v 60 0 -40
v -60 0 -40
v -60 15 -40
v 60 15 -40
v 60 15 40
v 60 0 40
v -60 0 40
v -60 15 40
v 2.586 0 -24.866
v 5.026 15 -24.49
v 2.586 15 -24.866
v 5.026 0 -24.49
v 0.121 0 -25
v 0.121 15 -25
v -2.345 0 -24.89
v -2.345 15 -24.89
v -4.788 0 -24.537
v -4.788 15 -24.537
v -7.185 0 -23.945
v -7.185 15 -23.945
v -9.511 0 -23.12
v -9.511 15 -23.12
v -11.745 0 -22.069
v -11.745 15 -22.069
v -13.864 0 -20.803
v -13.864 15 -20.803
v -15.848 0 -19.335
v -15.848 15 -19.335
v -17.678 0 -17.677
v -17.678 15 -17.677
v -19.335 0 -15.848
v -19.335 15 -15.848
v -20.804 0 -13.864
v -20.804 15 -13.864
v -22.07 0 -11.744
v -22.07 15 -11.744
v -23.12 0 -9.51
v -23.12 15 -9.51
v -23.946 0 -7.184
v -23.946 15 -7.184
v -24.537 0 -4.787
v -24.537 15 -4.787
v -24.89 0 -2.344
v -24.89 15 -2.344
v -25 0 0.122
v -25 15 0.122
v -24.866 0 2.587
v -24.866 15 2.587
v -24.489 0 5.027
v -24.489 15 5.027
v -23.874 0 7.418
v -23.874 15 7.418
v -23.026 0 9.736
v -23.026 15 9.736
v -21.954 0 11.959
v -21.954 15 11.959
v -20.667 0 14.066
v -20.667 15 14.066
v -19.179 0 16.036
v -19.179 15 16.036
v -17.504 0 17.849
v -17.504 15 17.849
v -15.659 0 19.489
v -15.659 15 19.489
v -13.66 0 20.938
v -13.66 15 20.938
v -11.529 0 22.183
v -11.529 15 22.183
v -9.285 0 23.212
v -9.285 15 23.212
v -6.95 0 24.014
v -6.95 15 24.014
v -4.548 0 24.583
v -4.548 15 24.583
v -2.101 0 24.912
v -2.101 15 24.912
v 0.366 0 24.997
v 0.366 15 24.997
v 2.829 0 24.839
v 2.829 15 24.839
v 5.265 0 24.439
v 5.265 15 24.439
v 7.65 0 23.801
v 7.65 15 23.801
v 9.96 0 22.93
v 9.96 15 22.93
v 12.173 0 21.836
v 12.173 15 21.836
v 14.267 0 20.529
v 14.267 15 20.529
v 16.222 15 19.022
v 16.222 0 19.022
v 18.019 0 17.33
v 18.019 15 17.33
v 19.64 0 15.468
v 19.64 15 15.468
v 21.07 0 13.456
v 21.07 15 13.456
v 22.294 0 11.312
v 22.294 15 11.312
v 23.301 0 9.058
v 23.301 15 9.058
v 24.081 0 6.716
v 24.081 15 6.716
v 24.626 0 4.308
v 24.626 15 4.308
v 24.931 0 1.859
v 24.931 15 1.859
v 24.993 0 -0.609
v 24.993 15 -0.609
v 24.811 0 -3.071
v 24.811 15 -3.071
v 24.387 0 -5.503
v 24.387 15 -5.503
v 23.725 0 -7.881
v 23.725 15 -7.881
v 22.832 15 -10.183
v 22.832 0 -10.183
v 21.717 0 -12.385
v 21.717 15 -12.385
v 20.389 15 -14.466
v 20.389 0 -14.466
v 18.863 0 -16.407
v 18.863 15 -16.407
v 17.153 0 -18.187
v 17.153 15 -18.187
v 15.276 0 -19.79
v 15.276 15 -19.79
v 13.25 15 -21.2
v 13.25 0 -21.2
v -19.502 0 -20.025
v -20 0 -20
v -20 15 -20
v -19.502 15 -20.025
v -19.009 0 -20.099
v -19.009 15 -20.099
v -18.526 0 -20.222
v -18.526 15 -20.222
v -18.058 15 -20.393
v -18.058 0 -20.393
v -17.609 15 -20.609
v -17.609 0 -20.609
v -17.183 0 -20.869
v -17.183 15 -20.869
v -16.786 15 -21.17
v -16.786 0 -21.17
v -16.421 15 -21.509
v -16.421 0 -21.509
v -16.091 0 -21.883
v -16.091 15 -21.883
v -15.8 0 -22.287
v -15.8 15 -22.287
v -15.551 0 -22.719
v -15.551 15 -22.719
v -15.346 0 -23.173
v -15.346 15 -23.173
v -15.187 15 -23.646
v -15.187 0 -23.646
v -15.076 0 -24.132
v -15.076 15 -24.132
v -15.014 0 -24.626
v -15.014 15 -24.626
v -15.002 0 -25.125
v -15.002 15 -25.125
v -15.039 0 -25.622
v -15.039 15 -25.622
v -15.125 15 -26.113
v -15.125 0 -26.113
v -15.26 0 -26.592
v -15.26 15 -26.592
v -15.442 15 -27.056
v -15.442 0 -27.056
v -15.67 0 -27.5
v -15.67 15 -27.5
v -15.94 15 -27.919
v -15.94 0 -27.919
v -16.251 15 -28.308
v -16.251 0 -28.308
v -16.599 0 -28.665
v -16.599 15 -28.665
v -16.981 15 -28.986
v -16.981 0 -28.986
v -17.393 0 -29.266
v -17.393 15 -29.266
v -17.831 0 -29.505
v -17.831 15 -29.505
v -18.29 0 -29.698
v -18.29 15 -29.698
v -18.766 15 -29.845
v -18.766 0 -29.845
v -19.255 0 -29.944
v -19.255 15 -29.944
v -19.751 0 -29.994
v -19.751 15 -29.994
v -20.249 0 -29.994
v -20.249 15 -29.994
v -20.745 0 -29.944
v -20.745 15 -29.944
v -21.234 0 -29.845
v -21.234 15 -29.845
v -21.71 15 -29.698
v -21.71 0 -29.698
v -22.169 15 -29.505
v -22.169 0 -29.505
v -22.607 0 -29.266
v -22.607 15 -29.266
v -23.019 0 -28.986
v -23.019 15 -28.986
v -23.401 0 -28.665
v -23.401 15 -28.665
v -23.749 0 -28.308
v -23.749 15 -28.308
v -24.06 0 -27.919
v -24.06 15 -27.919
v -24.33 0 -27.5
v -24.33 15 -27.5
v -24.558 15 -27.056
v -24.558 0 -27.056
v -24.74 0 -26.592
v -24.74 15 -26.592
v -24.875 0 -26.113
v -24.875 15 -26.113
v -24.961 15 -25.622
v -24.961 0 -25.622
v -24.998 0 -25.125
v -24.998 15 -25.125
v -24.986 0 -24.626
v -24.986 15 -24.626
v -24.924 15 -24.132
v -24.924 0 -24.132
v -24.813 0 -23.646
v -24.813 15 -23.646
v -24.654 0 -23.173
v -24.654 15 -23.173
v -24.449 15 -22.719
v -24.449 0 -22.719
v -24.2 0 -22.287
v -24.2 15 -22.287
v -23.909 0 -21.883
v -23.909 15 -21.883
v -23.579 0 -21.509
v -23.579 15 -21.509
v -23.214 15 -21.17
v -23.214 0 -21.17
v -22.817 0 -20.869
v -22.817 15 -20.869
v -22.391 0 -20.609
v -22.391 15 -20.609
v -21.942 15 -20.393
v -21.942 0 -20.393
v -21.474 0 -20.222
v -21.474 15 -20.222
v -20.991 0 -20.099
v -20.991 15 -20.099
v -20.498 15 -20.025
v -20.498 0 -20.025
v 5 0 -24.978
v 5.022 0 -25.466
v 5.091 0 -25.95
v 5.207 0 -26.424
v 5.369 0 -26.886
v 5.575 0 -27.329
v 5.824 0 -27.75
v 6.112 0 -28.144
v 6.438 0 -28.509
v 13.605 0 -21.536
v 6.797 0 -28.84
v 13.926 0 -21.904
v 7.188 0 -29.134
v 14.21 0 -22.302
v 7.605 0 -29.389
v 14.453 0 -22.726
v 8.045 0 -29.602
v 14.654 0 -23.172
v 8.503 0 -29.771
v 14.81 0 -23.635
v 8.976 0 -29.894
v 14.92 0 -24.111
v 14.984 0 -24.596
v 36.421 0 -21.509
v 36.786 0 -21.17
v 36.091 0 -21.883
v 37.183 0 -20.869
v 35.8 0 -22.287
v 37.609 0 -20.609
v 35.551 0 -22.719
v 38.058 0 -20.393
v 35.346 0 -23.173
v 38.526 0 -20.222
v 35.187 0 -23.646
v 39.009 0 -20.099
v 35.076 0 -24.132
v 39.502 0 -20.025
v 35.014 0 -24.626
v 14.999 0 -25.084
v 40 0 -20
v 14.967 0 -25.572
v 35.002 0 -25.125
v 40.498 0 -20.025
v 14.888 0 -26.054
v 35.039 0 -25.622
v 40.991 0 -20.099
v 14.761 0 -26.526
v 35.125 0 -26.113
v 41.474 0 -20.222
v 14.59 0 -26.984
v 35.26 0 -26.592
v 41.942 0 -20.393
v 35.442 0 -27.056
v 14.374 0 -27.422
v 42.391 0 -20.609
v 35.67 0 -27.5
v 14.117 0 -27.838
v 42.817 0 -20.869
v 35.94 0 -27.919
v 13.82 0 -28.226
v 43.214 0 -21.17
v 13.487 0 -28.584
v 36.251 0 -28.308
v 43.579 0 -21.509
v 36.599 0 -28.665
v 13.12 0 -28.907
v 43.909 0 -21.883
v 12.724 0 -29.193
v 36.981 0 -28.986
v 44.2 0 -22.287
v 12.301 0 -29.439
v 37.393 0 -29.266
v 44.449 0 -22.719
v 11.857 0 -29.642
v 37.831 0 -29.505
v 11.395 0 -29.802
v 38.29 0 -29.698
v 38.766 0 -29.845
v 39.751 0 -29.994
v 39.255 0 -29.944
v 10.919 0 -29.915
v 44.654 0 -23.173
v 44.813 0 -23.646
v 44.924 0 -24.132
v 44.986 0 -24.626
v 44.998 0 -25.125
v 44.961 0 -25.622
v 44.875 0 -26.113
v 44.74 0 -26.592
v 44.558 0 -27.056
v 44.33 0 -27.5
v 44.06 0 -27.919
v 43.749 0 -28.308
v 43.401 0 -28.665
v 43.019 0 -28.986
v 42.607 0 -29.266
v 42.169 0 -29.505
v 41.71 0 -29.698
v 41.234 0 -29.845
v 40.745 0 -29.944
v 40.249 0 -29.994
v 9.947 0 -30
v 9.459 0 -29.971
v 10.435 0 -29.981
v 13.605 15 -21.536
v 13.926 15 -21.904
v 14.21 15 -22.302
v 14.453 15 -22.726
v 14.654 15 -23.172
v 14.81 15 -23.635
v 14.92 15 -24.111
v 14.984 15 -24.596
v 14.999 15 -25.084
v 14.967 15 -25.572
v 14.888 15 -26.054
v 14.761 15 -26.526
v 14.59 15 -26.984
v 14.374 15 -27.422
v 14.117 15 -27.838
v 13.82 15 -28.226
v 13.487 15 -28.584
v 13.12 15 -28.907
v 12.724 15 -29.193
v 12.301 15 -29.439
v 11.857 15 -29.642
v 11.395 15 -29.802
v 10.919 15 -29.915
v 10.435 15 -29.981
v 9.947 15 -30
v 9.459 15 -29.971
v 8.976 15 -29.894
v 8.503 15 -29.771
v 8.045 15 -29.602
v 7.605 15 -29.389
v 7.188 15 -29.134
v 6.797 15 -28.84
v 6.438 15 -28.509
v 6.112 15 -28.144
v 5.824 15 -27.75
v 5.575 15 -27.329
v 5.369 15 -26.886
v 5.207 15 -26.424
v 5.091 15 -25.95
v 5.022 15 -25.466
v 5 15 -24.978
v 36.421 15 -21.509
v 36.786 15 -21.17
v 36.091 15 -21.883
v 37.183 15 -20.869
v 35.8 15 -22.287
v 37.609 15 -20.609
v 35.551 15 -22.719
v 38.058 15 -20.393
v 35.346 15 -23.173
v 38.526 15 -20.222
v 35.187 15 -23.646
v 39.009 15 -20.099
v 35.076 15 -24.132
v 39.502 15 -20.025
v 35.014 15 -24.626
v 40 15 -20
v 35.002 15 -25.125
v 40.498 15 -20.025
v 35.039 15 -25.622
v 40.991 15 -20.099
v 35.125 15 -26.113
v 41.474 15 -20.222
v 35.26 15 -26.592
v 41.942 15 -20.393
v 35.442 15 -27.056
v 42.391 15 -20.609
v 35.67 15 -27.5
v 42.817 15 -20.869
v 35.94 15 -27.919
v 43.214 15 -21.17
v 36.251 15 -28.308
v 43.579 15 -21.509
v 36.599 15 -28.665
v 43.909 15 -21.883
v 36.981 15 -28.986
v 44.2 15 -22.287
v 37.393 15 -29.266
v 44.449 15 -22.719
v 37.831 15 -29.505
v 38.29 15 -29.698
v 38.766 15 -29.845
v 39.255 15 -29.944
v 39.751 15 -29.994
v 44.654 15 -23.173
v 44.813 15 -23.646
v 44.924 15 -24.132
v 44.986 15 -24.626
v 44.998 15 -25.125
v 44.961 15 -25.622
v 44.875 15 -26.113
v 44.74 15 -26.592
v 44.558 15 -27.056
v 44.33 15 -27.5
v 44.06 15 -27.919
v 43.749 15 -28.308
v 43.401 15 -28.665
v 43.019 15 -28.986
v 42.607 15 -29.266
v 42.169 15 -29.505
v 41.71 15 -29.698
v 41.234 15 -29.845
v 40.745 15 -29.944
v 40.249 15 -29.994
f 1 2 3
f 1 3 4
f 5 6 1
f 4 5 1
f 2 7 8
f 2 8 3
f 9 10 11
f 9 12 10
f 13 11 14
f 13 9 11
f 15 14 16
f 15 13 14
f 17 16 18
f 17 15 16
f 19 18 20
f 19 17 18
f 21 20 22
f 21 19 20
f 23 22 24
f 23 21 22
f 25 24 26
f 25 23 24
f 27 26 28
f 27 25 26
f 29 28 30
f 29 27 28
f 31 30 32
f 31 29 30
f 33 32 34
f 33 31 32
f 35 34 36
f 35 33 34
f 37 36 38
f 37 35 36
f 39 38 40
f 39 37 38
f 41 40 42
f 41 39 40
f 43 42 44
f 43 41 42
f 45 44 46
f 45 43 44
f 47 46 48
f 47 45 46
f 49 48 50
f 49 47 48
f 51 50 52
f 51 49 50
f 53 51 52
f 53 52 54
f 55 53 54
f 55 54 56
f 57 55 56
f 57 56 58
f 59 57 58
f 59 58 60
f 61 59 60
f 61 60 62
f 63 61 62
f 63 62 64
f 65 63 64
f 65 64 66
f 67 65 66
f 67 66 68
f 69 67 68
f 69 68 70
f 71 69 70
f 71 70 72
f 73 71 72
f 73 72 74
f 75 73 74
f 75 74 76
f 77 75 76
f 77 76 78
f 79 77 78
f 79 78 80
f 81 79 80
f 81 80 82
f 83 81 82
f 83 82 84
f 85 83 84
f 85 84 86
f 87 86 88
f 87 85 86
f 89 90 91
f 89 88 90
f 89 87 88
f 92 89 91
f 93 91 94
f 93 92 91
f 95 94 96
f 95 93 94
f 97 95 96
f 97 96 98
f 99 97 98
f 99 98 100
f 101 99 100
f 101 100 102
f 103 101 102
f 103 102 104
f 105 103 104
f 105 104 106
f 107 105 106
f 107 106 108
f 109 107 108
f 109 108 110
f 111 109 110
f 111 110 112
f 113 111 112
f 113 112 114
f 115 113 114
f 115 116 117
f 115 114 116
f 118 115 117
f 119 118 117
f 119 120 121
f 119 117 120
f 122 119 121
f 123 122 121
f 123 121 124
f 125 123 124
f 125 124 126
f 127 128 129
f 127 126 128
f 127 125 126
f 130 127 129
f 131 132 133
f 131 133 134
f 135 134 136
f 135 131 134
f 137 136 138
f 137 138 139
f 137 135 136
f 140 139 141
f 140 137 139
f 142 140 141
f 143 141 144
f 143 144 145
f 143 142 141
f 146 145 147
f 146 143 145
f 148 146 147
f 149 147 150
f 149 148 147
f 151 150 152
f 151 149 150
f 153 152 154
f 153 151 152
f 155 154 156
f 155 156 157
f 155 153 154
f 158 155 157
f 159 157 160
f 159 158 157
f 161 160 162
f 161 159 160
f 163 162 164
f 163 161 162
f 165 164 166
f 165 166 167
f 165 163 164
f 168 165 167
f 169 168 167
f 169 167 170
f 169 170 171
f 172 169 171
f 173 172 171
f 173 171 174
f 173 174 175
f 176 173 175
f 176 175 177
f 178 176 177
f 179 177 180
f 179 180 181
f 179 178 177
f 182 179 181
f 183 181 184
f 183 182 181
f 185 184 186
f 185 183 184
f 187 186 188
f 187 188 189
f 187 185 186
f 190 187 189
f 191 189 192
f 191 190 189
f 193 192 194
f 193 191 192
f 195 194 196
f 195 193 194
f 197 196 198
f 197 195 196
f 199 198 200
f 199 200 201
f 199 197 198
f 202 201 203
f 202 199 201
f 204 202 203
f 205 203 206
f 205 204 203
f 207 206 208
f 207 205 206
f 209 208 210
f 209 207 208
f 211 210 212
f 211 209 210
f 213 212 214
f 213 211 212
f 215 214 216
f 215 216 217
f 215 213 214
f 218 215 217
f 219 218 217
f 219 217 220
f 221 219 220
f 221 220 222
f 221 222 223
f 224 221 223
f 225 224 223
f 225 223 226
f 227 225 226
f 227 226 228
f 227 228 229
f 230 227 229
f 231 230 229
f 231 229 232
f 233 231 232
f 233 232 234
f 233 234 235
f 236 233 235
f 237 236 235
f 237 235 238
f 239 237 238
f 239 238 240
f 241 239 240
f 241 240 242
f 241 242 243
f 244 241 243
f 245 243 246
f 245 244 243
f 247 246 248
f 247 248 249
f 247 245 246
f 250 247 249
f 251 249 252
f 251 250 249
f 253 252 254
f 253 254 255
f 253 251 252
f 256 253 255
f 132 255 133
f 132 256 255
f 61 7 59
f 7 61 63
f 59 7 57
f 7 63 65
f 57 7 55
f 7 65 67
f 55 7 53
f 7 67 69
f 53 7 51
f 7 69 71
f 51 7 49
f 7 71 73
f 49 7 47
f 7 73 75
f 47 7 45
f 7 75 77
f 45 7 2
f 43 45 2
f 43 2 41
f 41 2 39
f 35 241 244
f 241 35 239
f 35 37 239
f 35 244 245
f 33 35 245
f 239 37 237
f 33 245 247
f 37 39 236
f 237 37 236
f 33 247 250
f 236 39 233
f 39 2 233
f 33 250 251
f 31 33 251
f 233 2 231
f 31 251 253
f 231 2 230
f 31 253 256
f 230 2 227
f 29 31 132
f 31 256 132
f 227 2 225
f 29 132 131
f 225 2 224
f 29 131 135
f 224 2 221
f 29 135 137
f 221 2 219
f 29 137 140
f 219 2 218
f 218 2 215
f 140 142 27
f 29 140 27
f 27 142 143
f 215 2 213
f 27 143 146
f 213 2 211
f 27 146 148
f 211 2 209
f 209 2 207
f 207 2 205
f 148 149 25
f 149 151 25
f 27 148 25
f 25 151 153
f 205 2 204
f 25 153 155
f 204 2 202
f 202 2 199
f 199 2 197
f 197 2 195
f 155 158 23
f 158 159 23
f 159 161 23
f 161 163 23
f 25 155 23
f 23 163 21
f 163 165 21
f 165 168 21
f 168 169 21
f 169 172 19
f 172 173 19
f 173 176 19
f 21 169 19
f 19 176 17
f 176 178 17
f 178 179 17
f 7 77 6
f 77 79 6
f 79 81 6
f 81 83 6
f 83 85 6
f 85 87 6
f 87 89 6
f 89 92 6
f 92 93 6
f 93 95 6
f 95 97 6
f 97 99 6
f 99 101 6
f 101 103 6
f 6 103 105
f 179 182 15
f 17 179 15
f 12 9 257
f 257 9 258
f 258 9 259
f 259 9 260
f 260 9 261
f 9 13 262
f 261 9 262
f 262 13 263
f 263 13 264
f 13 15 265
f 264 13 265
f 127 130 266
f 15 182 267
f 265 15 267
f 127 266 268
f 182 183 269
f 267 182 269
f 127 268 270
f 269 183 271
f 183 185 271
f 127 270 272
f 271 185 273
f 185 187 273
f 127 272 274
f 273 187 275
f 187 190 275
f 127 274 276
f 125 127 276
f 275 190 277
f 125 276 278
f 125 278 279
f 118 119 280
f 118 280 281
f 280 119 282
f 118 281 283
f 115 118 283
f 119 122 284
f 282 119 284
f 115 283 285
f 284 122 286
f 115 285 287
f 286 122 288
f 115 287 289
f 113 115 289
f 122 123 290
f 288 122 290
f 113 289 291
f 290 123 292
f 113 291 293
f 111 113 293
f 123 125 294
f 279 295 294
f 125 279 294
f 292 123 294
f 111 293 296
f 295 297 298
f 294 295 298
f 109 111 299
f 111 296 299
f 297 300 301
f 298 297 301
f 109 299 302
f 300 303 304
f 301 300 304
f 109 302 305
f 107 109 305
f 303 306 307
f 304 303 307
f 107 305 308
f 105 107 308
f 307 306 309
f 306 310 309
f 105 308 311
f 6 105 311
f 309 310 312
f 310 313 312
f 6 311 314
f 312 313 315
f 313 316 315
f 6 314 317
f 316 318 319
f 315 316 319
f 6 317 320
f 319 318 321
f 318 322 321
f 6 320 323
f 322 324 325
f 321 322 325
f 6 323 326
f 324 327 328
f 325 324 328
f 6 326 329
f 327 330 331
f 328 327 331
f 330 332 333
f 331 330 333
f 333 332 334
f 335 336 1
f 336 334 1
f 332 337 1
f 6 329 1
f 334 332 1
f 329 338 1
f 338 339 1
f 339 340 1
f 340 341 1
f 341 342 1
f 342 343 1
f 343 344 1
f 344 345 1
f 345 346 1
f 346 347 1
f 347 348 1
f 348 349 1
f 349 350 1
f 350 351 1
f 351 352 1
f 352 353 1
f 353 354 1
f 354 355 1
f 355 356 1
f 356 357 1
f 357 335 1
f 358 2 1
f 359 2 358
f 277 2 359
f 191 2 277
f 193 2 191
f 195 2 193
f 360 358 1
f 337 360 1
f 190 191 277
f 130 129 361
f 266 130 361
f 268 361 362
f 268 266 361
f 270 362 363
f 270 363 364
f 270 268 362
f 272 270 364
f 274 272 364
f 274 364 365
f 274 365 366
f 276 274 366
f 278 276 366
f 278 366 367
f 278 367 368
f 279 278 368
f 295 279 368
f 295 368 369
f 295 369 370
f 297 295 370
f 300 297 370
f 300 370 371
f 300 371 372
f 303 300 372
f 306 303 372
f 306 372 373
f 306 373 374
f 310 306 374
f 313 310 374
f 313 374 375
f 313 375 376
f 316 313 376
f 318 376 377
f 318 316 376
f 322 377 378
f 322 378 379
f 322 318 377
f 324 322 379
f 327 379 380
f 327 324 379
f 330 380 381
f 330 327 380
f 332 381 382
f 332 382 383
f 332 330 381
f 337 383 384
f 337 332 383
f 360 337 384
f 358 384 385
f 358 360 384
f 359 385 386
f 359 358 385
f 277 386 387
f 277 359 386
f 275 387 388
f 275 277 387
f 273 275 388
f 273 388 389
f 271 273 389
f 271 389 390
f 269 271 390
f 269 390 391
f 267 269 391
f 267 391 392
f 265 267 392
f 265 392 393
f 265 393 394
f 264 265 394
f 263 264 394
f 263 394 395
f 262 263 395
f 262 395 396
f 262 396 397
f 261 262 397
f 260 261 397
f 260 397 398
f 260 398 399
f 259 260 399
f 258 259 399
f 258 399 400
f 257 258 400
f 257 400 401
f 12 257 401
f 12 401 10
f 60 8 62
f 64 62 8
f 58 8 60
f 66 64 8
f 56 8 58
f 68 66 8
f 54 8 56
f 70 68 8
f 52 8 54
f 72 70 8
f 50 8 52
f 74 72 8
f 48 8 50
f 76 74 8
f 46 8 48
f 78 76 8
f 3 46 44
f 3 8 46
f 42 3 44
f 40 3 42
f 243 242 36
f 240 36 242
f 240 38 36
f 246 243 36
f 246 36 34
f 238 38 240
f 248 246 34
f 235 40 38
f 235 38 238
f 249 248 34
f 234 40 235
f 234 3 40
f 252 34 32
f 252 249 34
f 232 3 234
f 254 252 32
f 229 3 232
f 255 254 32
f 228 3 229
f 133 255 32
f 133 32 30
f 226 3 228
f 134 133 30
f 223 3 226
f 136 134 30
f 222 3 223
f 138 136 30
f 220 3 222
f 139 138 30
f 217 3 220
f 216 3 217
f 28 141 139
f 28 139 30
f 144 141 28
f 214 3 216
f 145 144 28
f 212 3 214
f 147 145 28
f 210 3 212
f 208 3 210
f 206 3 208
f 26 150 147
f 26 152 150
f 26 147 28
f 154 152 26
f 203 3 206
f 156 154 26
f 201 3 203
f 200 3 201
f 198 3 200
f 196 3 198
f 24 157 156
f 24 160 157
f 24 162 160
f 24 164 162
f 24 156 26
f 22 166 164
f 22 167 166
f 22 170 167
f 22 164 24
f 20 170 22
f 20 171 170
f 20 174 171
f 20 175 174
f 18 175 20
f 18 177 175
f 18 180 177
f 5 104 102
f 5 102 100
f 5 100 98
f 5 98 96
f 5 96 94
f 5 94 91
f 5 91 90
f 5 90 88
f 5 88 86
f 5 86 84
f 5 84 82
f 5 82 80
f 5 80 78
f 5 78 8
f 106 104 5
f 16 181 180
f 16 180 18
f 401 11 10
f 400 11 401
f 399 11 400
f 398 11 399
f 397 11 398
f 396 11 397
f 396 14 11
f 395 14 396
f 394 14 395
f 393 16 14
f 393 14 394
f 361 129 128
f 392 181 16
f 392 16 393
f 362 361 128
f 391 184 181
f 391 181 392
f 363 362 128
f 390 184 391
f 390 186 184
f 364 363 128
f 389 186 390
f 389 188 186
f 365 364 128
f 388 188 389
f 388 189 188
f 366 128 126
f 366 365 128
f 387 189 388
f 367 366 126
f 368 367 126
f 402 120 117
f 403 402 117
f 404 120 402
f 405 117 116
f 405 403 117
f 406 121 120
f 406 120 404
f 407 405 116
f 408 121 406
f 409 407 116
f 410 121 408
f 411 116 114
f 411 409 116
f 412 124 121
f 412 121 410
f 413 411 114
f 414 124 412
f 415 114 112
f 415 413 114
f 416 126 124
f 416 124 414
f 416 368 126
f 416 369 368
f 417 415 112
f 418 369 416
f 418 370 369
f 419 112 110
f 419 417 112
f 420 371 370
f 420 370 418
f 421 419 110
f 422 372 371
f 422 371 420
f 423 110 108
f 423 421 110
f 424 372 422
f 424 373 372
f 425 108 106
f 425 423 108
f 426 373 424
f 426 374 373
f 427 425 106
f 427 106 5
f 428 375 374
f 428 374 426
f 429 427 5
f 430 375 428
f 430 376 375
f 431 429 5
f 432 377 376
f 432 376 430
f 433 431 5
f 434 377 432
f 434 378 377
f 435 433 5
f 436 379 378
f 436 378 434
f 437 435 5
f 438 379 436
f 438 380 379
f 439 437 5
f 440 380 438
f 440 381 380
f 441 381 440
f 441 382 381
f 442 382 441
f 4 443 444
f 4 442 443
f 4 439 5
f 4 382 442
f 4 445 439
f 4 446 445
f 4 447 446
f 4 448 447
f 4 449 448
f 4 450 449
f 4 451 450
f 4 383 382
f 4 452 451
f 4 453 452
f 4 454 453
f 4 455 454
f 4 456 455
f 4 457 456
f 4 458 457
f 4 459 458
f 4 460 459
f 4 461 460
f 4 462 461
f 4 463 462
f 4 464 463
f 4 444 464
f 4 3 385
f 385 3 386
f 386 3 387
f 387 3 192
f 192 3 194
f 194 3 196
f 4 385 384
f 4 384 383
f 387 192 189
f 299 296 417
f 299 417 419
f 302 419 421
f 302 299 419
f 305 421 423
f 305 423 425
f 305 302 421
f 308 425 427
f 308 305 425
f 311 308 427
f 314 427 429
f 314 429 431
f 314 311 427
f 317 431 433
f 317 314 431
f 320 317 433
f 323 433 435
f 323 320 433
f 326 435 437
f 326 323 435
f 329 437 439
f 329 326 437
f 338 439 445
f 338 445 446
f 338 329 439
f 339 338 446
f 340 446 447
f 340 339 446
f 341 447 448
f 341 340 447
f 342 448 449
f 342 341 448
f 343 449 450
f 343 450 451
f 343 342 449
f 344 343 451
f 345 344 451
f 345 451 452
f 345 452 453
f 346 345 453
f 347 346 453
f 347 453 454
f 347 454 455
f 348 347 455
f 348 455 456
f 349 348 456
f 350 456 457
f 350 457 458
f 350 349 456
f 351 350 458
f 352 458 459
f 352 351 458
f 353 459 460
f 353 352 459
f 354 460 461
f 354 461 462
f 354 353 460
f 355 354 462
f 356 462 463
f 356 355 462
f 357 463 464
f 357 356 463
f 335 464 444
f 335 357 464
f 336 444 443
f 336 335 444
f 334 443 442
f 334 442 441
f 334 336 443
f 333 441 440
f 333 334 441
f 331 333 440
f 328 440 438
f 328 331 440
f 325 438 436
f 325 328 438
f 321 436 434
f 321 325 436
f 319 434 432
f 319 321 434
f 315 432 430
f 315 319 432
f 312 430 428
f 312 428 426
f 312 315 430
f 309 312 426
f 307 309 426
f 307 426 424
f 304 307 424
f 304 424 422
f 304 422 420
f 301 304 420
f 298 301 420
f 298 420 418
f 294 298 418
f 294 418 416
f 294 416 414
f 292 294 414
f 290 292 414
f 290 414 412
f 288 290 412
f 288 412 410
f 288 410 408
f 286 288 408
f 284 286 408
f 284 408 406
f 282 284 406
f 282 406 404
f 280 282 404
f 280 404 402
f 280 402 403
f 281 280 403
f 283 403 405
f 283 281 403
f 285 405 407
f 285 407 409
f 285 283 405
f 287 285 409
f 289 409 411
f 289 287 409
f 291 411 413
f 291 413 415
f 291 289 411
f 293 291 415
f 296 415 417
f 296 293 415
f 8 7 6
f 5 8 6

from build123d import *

# Parameters (mm, degrees)
SKETCH_1_W             = 120
SKETCH_1_H             = 80
EXTRUDE_1_DEPTH        = 15
SKETCH_2_R             = 25
CUT_EXTRUDE_1_DEPTH    = 15
SKETCH_3_R             = 5
CUT_EXTRUDE_2_DEPTH    = 15
PATTERN_LINEAR_1_COUNT = 3
PATTERN_LINEAR_1_PITCH = 30


with BuildPart() as part:
    # 草图1 → 凸台-拉伸1 (new body)
    with BuildSketch(Plane(origin=(0, 0, 0), x_dir=(1, 0, 0), z_dir=(0, 1, 0))):
        Rectangle(SKETCH_1_W, SKETCH_1_H)
    extrude(amount=EXTRUDE_1_DEPTH)

    # 草图2 → 切除-拉伸1 (cut)
    with BuildSketch(Plane(origin=(0, 0, 0), x_dir=(1, 0, 0), z_dir=(0, 1, 0))):
        with Locations(Location((0, 0, 0), (0, 0, 270))):
            Circle(SKETCH_2_R)
    extrude(amount=CUT_EXTRUDE_1_DEPTH, mode=Mode.SUBTRACT)

    # 草图3 → 切除-拉伸2 (cut)
    with BuildSketch(Plane(origin=(0, 0, 0), x_dir=(1, 0, 0), z_dir=(0, 1, 0))):
        with Locations(Location((40, 25, 0), (0, 0, 270))):
            Circle(SKETCH_3_R)
    cut_extrude_2 = extrude(amount=CUT_EXTRUDE_2_DEPTH, mode=Mode.SUBTRACT)

    # 阵列(线性)1: 切除-拉伸2 ×3
    with Locations(*[(-i * PATTERN_LINEAR_1_PITCH, 0, 0) for i in range(1, PATTERN_LINEAR_1_COUNT)]):
        add(cut_extrude_2, mode=Mode.SUBTRACT)


solid = part.part
